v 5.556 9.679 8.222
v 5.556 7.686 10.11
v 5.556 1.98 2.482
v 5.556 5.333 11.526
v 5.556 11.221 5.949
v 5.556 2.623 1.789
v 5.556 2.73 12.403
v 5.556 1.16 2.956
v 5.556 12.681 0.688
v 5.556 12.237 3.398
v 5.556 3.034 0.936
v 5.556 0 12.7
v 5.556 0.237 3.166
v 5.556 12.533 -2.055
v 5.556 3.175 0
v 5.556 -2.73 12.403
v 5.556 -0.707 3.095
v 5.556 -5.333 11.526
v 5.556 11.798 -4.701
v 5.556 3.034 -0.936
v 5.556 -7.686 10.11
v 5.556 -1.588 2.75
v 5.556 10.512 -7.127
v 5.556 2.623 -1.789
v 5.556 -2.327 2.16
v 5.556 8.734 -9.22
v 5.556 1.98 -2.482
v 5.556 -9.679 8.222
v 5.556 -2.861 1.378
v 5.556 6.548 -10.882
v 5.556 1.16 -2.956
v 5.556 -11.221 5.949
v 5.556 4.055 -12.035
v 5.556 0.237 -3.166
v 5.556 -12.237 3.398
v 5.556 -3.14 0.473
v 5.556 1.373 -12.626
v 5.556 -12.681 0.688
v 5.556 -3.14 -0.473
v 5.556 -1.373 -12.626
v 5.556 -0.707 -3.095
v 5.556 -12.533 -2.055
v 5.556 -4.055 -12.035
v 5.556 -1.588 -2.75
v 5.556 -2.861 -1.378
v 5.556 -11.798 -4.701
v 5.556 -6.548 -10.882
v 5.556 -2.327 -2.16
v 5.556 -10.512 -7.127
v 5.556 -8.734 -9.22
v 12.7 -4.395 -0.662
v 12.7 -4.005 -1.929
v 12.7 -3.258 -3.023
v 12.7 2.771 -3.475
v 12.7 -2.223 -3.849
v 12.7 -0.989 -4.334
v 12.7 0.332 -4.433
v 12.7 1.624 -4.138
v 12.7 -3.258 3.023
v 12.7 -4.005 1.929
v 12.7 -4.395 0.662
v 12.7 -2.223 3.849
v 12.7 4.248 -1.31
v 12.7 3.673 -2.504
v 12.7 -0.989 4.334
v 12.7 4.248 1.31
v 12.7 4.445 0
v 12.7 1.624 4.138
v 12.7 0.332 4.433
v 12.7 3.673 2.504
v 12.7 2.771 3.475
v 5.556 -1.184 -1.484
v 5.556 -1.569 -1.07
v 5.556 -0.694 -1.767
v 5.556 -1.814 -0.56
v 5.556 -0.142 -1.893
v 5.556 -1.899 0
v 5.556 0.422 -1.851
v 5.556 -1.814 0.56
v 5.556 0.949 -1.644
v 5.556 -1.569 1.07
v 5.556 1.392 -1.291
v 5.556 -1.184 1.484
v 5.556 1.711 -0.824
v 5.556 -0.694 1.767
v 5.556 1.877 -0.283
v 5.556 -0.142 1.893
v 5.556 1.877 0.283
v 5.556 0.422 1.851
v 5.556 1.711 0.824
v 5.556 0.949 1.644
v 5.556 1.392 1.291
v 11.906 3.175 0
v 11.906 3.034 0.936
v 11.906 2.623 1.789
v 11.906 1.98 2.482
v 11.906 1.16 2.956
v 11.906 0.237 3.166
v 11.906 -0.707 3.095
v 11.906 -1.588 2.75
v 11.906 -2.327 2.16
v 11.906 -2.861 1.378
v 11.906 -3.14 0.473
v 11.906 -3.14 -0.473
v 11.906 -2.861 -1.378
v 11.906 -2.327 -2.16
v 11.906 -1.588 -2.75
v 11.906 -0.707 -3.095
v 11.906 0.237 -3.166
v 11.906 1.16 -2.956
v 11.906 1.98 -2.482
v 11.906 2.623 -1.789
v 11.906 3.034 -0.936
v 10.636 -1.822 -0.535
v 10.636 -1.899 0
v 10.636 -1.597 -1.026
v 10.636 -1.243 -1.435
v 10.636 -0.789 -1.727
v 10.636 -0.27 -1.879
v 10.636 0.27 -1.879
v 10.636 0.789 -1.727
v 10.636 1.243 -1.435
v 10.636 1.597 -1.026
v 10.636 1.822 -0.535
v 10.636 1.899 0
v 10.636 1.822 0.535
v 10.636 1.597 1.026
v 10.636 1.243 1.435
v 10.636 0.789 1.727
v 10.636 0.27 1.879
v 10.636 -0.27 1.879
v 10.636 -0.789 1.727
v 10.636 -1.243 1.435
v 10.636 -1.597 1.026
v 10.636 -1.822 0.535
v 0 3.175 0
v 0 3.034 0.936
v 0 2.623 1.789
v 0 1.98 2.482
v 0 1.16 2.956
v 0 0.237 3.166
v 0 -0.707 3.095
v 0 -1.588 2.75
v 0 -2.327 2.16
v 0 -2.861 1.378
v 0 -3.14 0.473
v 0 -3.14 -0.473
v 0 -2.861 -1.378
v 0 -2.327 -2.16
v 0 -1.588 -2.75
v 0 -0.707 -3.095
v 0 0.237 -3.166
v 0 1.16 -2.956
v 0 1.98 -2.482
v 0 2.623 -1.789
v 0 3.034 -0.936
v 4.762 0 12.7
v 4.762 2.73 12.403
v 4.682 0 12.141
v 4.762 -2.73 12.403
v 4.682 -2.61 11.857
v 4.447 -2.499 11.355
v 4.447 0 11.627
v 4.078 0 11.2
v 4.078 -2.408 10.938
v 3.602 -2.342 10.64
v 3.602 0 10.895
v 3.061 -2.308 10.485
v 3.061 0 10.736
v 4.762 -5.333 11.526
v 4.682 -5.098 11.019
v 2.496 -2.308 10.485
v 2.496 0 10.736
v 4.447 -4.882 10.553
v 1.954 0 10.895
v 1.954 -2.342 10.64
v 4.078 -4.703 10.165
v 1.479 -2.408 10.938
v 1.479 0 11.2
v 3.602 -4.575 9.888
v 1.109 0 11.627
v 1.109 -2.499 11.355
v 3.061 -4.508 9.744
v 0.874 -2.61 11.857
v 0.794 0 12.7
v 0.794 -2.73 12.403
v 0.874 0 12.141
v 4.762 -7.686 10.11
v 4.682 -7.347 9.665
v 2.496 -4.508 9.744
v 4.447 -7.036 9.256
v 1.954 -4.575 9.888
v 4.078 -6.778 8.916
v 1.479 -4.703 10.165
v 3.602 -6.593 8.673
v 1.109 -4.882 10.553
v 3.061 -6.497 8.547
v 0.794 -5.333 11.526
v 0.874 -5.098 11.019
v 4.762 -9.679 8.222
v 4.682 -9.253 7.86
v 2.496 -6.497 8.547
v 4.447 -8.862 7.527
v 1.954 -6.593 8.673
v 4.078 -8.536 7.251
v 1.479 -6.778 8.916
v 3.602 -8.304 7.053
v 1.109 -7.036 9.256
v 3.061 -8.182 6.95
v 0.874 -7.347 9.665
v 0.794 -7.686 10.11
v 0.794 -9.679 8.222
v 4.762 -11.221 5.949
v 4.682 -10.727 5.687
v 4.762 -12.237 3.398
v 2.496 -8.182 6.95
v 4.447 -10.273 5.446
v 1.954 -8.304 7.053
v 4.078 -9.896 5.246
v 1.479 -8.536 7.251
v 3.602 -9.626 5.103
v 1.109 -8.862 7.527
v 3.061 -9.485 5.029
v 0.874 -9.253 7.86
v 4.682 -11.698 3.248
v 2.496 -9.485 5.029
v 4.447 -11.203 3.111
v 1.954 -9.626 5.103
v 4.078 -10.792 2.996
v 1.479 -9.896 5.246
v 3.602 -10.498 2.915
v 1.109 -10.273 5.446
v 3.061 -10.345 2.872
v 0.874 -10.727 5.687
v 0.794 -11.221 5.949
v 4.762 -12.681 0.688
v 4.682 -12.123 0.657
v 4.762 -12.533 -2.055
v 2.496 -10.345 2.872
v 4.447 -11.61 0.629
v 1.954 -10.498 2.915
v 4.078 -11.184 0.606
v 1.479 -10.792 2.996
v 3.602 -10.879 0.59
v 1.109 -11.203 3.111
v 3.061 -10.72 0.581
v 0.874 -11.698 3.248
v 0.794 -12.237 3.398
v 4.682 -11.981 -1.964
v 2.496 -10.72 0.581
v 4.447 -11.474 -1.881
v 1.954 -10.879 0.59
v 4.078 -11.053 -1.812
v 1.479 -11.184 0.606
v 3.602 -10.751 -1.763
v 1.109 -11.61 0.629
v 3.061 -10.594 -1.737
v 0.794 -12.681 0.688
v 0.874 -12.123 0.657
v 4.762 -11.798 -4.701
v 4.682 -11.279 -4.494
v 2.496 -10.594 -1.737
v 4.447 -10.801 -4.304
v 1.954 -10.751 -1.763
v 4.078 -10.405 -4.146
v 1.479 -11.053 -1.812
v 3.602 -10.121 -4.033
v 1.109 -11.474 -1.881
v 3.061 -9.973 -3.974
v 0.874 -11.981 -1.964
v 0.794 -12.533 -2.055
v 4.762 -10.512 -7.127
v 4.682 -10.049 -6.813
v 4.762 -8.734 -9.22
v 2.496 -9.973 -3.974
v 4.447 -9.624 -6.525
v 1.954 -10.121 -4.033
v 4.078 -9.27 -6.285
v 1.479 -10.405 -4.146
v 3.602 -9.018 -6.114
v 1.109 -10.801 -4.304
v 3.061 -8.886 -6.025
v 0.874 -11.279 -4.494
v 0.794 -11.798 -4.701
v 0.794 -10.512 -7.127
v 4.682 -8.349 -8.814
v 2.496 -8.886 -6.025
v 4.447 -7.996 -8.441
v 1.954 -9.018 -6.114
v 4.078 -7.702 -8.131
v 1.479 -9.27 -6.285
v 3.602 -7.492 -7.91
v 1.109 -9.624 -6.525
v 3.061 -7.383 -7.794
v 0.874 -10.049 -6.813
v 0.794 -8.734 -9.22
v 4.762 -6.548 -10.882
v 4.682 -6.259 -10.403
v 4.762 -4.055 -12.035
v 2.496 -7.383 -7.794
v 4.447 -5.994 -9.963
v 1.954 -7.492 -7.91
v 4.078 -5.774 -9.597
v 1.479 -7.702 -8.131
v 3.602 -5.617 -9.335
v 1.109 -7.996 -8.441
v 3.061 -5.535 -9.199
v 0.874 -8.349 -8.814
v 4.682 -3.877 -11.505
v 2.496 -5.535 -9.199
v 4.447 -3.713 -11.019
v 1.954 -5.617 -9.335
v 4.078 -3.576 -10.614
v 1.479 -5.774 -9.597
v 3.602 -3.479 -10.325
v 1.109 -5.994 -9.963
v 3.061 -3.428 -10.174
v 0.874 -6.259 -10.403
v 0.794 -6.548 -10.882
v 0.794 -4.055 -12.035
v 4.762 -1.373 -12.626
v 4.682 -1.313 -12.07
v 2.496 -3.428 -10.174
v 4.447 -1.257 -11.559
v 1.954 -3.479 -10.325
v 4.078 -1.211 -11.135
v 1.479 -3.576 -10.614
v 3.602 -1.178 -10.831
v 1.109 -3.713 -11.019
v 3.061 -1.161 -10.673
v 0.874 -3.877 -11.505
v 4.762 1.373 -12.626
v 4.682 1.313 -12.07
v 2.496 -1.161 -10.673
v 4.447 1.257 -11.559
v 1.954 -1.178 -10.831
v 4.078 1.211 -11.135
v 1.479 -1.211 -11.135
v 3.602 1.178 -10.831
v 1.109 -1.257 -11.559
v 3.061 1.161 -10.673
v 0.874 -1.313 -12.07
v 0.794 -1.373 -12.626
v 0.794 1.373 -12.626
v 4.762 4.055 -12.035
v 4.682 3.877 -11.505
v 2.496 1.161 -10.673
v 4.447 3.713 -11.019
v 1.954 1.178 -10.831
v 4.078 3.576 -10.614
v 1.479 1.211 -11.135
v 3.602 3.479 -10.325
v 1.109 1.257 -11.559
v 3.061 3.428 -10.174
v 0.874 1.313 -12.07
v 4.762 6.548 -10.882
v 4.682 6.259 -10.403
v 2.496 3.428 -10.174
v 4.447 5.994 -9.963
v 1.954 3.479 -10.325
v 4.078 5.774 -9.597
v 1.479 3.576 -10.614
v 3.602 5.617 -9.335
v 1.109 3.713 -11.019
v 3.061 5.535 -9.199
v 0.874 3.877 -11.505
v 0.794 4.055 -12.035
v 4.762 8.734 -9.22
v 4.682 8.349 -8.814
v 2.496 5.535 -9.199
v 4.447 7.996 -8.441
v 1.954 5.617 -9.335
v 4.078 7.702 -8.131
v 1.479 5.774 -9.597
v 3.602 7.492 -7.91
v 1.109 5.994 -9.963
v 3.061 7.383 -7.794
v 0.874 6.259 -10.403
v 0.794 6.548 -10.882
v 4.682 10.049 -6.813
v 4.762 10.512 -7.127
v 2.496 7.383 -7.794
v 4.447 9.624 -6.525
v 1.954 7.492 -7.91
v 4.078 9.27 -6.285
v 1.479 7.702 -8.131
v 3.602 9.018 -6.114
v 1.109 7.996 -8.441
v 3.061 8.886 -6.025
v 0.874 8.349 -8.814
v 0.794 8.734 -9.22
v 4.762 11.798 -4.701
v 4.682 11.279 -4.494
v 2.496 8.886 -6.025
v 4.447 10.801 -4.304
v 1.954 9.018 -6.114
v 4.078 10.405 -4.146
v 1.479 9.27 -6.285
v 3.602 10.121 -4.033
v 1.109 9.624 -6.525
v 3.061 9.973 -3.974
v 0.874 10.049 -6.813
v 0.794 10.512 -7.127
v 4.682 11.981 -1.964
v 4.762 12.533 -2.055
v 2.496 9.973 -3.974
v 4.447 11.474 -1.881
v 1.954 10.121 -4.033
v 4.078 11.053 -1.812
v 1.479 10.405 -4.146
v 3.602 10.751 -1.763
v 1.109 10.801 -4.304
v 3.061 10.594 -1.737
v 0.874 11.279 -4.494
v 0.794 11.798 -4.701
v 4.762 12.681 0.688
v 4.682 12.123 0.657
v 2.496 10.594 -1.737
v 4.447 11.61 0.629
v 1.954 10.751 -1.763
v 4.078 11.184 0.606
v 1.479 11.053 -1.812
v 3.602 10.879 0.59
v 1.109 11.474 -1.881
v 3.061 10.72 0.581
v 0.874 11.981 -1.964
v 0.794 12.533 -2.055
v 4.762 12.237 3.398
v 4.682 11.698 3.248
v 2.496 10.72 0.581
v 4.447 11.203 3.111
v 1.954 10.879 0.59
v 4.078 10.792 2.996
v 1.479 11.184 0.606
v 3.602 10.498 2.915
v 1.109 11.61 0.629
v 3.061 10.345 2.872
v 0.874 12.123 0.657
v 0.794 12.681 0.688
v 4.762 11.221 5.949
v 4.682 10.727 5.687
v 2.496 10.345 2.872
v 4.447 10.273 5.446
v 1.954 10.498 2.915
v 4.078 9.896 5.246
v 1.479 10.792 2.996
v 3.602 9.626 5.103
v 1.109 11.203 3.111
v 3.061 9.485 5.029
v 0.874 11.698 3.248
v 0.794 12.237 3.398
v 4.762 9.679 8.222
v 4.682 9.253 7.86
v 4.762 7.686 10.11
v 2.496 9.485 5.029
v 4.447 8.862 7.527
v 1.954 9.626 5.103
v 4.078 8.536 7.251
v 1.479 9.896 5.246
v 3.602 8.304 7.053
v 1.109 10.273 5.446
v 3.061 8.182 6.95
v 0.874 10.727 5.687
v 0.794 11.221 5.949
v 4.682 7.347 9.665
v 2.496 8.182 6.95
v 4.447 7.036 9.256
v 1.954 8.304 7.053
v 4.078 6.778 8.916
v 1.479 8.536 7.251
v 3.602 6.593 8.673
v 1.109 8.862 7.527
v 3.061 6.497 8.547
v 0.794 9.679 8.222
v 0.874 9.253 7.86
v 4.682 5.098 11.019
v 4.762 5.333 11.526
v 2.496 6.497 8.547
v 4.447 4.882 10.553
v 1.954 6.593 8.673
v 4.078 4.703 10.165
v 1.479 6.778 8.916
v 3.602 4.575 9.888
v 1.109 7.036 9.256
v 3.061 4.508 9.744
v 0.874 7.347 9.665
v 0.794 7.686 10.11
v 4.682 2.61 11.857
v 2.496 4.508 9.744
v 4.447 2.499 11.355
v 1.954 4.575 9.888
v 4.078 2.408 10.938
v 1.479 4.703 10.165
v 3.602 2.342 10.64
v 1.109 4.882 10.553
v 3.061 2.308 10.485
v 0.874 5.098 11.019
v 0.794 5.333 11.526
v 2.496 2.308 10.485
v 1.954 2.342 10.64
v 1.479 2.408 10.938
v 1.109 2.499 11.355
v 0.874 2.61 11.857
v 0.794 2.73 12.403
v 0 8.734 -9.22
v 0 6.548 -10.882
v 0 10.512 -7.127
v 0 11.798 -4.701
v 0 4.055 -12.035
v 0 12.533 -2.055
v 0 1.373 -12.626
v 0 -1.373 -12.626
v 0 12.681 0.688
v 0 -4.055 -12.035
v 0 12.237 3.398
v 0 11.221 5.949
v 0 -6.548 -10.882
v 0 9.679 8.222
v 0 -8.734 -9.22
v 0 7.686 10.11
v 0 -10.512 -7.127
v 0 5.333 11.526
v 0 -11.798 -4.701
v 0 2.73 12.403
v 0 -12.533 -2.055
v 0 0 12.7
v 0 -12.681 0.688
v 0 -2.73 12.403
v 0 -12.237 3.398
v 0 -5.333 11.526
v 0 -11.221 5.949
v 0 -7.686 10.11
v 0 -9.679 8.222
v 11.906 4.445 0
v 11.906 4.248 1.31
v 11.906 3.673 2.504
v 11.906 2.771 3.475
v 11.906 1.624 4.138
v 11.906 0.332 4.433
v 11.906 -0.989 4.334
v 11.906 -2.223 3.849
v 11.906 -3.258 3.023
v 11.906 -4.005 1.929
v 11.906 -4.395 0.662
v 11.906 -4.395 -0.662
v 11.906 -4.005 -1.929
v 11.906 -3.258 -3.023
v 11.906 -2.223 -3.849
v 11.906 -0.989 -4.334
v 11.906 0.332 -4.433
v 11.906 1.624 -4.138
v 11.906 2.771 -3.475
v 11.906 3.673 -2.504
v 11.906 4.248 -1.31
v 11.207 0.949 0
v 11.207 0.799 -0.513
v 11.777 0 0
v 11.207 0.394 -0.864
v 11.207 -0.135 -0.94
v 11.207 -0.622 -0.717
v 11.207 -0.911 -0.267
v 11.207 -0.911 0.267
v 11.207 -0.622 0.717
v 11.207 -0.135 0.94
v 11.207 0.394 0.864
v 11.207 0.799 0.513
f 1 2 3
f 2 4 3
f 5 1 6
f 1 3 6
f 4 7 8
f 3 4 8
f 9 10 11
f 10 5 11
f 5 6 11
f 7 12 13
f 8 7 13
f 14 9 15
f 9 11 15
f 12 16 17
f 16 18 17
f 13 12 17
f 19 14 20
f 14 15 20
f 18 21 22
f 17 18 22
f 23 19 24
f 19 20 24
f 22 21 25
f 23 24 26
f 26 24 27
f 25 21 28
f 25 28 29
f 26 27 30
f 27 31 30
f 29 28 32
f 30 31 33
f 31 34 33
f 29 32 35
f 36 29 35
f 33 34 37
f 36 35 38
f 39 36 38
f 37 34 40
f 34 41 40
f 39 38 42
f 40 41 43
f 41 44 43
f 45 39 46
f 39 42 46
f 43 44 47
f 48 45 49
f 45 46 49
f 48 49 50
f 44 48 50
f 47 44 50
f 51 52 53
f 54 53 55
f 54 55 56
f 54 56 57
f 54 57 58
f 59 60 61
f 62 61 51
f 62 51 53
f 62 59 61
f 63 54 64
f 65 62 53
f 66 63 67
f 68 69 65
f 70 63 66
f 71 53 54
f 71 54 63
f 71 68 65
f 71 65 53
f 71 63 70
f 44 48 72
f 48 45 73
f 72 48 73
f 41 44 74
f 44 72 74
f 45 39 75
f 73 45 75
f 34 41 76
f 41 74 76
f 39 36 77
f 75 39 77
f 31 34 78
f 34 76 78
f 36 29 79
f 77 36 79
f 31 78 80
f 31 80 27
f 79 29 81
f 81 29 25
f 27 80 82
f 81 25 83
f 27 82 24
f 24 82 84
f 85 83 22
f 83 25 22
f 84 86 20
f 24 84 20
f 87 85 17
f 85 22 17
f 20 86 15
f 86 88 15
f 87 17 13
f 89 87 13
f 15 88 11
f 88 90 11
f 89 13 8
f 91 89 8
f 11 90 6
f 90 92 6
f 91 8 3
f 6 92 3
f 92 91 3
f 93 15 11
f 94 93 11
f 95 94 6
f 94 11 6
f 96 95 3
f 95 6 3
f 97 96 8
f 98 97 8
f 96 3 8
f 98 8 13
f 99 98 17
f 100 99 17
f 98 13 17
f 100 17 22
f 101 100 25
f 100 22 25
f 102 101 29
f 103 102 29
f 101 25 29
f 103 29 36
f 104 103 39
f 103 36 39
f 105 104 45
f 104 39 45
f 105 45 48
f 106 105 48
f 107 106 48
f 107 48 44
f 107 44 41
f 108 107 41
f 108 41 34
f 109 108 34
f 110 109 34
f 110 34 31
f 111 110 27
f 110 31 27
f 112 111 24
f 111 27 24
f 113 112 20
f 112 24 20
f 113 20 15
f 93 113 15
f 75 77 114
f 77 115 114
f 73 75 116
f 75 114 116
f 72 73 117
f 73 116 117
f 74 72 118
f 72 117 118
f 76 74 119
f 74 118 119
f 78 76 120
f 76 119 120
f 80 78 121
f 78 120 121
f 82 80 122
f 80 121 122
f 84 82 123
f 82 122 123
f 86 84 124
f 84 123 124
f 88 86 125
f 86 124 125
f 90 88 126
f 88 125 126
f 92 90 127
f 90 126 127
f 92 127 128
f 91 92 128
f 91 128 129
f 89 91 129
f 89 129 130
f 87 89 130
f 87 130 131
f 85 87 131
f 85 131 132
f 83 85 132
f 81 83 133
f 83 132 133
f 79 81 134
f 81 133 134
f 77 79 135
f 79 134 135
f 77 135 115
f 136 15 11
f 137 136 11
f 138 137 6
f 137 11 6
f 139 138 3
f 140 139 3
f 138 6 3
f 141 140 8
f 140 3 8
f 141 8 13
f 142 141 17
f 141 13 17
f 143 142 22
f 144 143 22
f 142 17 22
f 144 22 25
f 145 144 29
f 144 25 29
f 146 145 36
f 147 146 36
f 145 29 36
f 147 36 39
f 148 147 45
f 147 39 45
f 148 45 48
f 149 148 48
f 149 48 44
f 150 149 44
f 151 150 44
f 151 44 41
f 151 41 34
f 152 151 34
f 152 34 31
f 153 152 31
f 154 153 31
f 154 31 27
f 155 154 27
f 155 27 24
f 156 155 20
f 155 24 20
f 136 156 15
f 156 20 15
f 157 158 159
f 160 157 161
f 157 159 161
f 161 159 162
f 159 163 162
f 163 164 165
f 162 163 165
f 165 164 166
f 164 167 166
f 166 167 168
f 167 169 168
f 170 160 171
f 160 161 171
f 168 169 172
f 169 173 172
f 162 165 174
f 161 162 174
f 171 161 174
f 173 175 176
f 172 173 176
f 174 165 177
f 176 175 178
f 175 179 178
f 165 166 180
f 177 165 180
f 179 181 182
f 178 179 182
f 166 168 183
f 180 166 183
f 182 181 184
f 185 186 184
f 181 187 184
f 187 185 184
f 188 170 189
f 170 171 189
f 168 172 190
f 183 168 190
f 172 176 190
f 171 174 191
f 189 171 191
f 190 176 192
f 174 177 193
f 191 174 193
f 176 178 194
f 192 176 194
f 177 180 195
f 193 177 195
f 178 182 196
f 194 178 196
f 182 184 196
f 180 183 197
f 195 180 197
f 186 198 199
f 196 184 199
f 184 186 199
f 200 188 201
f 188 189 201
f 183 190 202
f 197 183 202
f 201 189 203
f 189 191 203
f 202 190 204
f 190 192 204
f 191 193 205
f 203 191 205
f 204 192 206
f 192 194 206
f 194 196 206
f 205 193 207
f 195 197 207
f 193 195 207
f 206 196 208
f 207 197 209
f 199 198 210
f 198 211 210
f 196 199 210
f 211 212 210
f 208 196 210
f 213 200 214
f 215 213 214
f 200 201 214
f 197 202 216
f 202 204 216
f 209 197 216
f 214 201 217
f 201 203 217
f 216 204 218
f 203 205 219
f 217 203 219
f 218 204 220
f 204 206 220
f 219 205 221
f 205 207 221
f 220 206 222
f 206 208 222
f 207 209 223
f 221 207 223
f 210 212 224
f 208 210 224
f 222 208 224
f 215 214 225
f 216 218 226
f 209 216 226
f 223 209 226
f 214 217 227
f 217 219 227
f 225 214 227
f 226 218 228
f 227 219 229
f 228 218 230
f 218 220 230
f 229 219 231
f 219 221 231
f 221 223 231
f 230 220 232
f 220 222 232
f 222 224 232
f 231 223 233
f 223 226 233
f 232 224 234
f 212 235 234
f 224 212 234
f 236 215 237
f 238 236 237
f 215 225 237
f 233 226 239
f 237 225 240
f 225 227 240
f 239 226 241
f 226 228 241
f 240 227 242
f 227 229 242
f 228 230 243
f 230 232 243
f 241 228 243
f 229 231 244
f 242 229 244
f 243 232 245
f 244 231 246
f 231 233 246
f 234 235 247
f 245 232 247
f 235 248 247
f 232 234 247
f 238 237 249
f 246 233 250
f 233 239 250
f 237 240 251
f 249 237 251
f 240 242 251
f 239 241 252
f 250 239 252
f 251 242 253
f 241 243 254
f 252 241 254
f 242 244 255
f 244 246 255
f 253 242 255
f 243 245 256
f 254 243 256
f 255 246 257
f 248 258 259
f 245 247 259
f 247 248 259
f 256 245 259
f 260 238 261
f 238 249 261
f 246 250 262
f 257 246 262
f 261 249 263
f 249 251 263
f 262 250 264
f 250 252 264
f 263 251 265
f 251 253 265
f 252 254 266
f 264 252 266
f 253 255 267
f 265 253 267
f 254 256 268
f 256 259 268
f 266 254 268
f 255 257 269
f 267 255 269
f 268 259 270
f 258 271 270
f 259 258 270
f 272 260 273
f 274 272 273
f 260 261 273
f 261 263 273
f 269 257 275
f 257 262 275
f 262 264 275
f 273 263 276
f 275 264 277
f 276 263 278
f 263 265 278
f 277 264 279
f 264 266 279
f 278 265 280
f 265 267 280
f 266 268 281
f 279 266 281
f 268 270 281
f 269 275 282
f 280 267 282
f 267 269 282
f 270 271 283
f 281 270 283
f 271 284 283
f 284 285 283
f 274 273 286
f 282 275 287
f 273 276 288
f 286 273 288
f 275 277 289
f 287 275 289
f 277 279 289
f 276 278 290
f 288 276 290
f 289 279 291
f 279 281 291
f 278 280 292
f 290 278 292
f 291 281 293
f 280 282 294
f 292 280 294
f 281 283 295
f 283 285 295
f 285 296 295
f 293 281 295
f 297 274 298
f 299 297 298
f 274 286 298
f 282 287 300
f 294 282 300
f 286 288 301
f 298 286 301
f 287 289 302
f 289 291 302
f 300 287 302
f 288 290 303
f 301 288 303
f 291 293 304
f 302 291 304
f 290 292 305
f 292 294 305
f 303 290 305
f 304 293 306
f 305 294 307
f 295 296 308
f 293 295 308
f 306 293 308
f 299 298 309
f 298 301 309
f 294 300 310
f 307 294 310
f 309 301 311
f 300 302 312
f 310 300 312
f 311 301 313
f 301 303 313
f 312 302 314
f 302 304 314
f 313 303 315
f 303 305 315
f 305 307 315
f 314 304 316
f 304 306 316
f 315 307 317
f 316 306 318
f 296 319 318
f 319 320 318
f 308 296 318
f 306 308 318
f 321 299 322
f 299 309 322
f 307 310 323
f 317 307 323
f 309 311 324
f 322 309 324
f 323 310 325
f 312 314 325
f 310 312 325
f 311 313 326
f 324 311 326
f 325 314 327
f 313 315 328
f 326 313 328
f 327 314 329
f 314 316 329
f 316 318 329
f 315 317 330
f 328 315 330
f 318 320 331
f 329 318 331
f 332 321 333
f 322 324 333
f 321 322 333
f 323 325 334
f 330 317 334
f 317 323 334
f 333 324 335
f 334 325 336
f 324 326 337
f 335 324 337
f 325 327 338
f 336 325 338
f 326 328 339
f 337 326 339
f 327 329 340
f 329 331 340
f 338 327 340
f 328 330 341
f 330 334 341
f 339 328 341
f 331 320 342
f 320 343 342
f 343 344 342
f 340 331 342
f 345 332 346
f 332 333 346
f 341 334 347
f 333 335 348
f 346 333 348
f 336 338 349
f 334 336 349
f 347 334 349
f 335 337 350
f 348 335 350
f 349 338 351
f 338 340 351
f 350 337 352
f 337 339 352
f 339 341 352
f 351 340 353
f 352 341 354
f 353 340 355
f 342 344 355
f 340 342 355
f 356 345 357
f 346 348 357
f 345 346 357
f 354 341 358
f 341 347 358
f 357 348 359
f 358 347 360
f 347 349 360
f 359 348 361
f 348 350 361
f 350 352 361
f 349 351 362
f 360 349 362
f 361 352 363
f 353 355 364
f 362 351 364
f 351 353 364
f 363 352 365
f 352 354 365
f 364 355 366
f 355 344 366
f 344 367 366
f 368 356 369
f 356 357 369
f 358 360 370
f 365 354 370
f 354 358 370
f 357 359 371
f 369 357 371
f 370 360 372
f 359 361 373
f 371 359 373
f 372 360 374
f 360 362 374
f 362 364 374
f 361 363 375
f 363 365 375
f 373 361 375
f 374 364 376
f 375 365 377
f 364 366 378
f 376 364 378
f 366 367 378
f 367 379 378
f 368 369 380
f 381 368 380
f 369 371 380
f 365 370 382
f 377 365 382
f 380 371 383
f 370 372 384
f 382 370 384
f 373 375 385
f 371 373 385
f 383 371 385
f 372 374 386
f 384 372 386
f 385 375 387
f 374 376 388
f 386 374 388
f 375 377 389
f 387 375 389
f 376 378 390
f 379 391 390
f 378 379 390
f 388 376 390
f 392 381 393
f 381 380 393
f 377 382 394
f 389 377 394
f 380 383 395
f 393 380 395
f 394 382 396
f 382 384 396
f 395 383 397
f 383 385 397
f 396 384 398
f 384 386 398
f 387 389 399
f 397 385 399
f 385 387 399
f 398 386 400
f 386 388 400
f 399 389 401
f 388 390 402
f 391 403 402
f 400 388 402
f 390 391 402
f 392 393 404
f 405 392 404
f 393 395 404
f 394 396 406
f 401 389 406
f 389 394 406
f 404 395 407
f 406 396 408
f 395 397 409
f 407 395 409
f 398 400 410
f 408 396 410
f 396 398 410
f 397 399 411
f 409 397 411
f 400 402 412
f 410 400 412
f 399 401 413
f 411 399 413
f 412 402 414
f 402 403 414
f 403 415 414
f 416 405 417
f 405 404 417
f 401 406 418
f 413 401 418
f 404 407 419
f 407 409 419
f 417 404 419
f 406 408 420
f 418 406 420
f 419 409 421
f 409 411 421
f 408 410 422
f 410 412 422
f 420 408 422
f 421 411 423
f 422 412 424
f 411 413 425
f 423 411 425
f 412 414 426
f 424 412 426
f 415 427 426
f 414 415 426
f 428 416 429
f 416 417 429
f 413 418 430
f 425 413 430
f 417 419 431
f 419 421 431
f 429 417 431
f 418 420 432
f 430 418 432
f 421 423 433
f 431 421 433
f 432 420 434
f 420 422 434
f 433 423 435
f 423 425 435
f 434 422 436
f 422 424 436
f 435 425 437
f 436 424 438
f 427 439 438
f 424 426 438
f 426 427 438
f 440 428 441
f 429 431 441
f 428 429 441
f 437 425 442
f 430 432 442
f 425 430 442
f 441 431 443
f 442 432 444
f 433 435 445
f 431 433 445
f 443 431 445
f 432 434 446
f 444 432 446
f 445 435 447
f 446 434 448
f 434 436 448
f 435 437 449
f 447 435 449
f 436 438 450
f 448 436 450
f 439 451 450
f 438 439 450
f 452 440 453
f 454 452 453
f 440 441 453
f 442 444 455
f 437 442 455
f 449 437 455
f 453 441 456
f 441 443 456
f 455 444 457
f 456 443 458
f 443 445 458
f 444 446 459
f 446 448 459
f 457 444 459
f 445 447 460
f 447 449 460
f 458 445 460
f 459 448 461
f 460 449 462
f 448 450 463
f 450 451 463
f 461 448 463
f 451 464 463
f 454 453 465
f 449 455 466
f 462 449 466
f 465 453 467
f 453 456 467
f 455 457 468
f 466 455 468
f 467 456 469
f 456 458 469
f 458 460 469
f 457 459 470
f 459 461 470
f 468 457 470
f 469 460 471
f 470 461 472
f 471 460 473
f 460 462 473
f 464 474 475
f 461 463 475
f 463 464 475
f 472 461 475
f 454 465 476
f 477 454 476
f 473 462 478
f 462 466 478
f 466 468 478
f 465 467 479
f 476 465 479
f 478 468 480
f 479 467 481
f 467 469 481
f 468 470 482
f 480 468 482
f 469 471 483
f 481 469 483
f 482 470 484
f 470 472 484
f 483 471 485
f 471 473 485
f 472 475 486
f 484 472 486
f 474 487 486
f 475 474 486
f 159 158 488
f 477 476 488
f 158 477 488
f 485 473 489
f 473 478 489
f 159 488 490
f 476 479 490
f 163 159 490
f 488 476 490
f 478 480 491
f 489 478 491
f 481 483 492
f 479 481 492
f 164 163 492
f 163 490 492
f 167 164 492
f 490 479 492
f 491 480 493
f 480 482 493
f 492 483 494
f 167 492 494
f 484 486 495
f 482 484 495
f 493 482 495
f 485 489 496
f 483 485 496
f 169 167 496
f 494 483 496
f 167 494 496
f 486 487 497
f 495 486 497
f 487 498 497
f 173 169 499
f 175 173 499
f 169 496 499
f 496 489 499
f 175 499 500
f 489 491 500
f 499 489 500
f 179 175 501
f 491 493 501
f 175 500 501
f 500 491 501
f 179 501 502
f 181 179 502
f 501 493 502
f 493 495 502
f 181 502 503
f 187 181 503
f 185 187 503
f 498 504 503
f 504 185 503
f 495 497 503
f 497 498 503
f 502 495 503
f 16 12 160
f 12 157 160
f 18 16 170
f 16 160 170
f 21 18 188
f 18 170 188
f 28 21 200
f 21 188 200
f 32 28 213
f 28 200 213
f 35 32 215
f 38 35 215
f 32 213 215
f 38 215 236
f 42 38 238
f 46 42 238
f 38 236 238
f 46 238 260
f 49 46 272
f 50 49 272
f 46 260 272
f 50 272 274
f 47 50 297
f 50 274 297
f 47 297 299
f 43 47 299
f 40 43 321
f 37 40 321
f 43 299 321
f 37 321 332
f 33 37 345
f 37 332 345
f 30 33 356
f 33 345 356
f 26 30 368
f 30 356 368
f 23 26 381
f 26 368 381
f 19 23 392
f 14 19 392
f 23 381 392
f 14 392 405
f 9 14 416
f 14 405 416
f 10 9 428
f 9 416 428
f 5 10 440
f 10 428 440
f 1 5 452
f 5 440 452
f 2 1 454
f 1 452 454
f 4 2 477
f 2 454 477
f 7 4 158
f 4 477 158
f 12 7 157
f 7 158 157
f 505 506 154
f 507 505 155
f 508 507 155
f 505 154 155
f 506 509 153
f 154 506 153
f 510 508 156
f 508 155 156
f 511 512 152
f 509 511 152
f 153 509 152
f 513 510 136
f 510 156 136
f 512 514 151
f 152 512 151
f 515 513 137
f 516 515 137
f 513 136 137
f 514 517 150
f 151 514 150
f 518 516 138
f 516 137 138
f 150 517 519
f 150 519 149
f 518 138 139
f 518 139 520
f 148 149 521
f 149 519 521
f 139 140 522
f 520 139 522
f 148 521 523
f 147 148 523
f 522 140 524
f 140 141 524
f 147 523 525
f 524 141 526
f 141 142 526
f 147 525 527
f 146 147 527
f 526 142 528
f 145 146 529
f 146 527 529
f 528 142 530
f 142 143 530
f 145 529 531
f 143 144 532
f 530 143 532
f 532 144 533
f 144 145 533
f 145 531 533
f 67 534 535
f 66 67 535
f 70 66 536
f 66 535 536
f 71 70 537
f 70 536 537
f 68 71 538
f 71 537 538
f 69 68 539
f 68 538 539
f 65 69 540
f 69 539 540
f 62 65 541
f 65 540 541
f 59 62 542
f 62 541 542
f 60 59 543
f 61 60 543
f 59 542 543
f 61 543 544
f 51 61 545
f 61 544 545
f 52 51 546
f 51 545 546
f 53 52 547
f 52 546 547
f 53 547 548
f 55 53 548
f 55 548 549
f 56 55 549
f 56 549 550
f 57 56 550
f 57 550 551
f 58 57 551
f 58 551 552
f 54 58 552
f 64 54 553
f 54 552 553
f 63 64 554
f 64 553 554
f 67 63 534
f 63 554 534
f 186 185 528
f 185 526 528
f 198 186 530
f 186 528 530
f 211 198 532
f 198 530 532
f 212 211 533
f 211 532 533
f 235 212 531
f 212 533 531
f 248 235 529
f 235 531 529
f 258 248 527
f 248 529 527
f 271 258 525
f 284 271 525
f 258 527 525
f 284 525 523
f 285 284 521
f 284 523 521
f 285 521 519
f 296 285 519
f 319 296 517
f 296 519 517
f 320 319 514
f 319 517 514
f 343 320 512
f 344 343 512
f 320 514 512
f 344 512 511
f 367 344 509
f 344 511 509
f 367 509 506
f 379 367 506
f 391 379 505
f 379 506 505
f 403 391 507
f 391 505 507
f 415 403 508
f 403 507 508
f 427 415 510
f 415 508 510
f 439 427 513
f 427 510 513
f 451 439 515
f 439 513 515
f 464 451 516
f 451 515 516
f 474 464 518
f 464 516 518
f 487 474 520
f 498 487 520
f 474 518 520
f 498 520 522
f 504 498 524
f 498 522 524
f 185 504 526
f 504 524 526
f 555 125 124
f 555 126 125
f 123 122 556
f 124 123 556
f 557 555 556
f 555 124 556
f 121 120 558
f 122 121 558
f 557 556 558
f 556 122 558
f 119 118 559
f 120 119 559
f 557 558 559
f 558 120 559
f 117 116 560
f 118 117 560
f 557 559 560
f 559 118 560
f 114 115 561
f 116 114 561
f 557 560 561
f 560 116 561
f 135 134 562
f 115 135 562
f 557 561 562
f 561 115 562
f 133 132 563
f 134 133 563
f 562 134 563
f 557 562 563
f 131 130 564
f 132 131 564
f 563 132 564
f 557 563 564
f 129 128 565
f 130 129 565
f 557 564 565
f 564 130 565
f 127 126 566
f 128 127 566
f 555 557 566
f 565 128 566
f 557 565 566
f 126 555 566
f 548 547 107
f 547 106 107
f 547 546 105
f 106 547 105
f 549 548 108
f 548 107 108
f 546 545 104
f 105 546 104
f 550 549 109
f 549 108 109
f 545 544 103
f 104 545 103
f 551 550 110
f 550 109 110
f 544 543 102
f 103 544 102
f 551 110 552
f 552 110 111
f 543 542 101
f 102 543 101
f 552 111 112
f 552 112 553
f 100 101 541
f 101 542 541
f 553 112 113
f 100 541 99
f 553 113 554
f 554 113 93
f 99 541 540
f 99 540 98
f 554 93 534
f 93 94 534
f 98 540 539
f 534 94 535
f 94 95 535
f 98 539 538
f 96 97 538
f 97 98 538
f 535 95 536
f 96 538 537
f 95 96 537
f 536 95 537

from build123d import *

# Parameters (mm, degrees)
F2_R     = 3.175
F3_DEPTH = 5.55625
F4_DEPTH = 6.35
F5_R     = 4.445
F5_R_2   = 3.175
F6_DEPTH = 0.79375
F7_D     = 3.7973
F7_DEPTH = 5.08
F7_TIP   = 1.1408240143


with BuildPart() as f1:
    # F0 (on Front) → F1 (revolve)
    with BuildSketch(Plane.XZ):
        with BuildLine():
            Line((0, 12.7), (0, 0))
            Line((0, 0), (5.55625, 0))
            Line((5.55625, 0), (5.55625, 12.7))
            Line((5.55625, 12.7), (4.7625, 12.7))
            ThreePointArc((4.7625, 12.7), (2.778125, 10.715625), (0.79375, 12.7))
            Line((0.79375, 12.7), (0, 12.7))
        make_face()
    revolve(axis=Axis((2.778125, 0, 0), (1, 0, 0)))

    # F2 (on face) → F3 (cut, through all)
    with BuildSketch(Plane.YZ.offset(5.55625)):
        Circle(F2_R)
    extrude(amount=-F3_DEPTH, mode=Mode.SUBTRACT)


with BuildPart() as f4:
    # F2 (on face) → F4 (new body)
    with BuildSketch(Plane.YZ.offset(5.55625)):
        Circle(F2_R)
    extrude(amount=F4_DEPTH)

    # F5 (on face) → F6 (join)
    with BuildSketch(Plane.YZ.offset(11.90625)):
        Circle(F5_R)
        Circle(F5_R_2, mode=Mode.SUBTRACT)
        Circle(F5_R_2)
    extrude(amount=F6_DEPTH)

    # F7
    with Locations(Plane(origin=(5.55625, 0, 0), x_dir=(0, 1, 0), z_dir=(-1, 0, 0))):
        with Locations((0, 0)):
            Hole(F7_D / 2, depth=F7_DEPTH)
            with Locations((0, 0, -(F7_DEPTH + F7_TIP / 2))):  # 118° drill point
                Cone(0, F7_D / 2, F7_TIP, mode=Mode.SUBTRACT)


solid = Compound([f1.part, f4.part])
